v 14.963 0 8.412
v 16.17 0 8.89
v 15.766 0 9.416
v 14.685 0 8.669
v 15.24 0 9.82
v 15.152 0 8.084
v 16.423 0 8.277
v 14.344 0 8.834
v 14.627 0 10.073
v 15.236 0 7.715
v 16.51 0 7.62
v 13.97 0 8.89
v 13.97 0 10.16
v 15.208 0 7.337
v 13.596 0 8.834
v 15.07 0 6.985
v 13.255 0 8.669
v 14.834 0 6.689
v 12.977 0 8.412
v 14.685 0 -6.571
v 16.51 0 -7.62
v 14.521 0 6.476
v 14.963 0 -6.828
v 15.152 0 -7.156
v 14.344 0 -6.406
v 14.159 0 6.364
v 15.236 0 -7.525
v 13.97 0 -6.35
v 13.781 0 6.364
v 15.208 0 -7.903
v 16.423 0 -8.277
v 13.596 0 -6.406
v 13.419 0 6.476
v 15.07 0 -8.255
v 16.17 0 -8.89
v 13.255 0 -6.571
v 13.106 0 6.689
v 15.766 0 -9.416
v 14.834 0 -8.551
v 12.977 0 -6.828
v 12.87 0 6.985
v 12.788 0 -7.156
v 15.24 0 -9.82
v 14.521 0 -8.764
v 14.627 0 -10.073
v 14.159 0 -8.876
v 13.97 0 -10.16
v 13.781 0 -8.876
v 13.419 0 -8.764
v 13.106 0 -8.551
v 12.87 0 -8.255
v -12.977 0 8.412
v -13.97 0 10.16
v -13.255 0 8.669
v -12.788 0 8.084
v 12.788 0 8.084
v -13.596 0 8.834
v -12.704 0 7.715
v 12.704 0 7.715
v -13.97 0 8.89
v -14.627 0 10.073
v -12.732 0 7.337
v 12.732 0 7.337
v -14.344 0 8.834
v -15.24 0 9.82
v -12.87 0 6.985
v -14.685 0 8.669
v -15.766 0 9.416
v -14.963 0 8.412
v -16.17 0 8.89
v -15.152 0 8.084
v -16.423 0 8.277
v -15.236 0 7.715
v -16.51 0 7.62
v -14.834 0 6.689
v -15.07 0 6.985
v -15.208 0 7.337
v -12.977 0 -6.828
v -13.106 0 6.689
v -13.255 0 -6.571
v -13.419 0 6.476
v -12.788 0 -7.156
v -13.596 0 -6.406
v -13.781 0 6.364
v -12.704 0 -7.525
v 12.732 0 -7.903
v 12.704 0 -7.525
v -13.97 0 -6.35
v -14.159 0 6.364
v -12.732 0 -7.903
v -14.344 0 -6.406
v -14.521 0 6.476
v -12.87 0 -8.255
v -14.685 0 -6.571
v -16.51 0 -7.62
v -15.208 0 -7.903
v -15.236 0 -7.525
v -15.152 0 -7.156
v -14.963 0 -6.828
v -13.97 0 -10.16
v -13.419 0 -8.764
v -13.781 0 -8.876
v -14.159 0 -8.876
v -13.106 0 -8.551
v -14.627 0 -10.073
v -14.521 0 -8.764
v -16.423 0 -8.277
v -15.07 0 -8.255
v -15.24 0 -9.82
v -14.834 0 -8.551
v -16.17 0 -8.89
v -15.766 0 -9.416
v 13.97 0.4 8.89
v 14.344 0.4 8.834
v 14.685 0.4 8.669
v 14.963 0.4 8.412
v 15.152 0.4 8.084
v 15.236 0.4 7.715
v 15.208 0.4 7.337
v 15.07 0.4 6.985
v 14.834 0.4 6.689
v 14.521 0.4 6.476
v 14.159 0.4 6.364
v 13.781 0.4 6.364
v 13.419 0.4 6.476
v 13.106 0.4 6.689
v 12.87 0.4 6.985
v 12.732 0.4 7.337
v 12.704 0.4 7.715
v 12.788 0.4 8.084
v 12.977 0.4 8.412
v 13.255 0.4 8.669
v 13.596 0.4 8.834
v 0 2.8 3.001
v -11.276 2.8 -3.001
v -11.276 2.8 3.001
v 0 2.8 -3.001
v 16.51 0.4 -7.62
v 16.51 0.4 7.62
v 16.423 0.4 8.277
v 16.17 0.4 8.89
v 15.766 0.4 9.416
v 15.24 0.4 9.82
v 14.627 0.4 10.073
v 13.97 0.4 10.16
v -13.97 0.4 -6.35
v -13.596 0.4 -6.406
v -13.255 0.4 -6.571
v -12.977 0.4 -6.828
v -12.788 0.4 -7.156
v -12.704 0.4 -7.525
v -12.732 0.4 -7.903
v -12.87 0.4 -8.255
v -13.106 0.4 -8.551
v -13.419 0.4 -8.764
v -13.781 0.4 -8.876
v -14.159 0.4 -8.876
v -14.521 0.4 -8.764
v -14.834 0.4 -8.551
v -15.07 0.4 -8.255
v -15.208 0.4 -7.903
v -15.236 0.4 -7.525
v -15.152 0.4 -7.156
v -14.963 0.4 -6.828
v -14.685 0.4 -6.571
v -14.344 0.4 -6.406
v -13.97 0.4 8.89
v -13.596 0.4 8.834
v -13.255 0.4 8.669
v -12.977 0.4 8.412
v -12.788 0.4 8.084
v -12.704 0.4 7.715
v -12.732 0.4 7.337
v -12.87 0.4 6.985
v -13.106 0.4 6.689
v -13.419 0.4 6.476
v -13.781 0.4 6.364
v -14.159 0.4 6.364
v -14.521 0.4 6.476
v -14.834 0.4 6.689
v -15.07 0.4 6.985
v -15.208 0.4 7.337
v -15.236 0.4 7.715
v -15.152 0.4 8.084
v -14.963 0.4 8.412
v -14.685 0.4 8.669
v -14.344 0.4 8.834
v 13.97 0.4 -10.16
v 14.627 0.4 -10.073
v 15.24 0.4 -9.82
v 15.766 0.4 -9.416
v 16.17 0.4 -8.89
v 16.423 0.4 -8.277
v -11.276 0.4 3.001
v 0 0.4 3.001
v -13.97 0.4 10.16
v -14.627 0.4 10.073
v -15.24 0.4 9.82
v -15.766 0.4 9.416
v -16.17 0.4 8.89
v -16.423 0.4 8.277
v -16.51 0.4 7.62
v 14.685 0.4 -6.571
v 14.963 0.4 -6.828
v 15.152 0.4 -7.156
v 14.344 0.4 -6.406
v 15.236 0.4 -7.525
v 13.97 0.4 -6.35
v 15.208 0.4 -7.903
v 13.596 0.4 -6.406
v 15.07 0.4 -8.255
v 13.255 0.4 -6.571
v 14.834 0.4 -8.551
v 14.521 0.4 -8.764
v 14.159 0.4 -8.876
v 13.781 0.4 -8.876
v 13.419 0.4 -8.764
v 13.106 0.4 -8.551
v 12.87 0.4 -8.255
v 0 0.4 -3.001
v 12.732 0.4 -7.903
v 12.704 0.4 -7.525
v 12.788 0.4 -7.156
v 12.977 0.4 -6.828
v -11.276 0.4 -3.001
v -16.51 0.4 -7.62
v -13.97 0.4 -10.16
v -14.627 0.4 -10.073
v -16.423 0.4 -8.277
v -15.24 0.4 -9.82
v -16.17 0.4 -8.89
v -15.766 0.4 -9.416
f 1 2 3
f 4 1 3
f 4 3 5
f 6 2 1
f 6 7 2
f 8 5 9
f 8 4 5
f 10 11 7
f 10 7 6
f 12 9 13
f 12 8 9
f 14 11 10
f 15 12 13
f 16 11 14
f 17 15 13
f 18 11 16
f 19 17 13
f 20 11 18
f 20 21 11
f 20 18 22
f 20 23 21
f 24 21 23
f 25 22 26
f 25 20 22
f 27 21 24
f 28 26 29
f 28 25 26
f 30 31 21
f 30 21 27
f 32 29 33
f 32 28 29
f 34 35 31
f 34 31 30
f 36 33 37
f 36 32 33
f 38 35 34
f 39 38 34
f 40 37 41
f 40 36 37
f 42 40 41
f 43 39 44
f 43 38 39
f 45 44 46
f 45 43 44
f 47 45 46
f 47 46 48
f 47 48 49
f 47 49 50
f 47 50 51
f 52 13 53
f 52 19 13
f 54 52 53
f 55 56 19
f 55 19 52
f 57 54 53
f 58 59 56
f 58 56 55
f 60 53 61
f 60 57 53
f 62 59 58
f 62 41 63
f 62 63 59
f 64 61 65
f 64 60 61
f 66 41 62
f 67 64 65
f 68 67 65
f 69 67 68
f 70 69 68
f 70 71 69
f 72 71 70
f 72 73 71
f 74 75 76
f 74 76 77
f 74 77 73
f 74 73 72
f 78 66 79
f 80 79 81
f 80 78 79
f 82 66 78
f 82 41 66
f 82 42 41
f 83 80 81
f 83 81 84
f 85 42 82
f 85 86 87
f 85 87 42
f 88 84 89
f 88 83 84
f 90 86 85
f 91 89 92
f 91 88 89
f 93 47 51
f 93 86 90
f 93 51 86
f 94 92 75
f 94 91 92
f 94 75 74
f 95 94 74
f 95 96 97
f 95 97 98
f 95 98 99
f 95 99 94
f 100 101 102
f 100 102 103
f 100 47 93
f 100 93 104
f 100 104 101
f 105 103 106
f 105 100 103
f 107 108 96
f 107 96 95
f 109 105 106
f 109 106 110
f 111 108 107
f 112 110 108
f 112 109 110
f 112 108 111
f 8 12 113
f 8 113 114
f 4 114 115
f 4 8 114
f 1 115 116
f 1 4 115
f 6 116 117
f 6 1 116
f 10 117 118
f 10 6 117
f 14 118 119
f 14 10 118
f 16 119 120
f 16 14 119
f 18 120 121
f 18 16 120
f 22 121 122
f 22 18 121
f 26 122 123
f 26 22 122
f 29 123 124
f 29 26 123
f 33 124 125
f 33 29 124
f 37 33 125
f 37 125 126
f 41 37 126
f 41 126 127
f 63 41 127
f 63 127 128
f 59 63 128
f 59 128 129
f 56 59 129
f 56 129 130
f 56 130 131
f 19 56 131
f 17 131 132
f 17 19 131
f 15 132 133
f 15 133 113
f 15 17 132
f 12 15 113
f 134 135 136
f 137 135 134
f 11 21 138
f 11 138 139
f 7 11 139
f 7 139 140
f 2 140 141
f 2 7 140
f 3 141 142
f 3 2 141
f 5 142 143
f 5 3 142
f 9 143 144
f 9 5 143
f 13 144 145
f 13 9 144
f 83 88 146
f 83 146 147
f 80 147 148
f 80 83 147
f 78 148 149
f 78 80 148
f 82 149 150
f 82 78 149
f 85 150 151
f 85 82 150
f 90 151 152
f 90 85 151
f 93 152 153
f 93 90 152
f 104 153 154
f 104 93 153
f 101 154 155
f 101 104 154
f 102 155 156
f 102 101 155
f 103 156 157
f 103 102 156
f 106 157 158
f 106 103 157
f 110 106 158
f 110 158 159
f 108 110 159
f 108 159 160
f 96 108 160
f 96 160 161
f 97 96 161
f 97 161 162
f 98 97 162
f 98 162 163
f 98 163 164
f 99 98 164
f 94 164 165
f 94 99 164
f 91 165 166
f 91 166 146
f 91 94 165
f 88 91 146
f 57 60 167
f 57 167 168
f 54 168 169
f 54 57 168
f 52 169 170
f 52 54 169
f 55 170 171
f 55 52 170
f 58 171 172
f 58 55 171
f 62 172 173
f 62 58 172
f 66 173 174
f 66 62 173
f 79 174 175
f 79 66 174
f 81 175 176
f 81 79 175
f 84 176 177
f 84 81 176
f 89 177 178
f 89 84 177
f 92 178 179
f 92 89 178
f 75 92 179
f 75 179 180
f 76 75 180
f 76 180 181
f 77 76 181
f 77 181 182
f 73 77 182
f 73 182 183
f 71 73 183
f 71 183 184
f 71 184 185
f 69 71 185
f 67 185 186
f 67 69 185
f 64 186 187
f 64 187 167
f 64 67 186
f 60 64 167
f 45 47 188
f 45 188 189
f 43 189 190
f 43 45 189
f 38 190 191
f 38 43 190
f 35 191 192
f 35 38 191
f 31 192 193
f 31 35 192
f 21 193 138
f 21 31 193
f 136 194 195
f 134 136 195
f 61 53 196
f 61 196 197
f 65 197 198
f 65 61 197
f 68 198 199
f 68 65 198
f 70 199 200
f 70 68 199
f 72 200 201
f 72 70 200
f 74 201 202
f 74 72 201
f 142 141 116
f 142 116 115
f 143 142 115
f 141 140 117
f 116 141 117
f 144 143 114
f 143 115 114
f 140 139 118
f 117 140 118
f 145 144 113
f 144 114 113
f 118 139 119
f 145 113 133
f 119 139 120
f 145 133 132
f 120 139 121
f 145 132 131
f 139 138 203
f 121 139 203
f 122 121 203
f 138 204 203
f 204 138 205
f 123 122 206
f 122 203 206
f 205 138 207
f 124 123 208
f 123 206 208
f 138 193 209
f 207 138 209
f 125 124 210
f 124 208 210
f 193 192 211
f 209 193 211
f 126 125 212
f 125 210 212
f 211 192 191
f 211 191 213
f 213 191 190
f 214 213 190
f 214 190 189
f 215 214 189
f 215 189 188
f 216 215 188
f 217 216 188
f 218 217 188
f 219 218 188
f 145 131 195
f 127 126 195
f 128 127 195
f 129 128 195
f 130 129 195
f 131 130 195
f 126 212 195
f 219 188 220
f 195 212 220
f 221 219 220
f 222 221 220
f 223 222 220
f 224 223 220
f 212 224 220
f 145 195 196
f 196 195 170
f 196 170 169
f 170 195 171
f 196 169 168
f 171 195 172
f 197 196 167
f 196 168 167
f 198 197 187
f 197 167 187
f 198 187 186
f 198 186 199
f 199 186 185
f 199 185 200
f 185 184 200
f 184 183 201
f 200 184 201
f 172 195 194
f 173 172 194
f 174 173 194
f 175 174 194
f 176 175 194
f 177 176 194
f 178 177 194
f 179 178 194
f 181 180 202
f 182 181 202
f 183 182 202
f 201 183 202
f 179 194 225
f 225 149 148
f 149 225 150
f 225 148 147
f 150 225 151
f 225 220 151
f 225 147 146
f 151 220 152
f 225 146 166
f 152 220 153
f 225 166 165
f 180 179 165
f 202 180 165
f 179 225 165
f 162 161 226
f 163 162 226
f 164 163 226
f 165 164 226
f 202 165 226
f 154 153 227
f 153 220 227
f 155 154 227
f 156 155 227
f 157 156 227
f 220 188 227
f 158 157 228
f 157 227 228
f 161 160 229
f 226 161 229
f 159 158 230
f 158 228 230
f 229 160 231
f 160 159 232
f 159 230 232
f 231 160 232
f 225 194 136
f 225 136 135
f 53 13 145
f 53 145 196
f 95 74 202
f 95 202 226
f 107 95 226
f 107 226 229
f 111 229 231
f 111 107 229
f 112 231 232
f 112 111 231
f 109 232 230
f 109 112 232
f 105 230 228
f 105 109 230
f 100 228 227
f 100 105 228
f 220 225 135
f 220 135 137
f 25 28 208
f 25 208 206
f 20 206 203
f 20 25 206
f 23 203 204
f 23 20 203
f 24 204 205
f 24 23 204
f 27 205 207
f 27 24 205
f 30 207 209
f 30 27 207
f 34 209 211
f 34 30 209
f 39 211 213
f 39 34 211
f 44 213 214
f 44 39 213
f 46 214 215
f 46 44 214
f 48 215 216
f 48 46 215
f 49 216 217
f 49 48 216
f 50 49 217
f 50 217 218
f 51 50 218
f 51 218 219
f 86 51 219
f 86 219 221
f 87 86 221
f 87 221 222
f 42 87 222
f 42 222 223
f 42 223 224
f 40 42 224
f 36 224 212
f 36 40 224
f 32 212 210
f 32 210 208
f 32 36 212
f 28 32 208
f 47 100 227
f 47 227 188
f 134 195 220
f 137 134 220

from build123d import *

# Parameters (mm, degrees)
SKETCH1_R           = 1.27
BOSS_EXTRUDE1_DEPTH = 0.4
SKETCH2_W           = 11.275942915
SKETCH2_H           = 6.002616378
BOSS_EXTRUDE2_DEPTH = 2.4


with BuildPart() as part:
    # Sketch1 → Boss-Extrude1 (new body)
    with BuildSketch(Plane(origin=(0, 0, 0), x_dir=(1, 0, 0), z_dir=(0, 1, 0))):
        with BuildLine():
            Line((13.97, -10.16), (-13.97, -10.16))
            ThreePointArc((-13.97, -10.16), (-15.766051224, -9.416051224), (-16.51, -7.62))
            Line((-16.51, -7.62), (-16.51, 7.62))
            ThreePointArc((-16.51, 7.62), (-15.766051224, 9.416051224), (-13.97, 10.16))
            Line((-13.97, 10.16), (13.97, 10.16))
            ThreePointArc((13.97, 10.16), (15.766051224, 9.416051224), (16.51, 7.62))
            Line((16.51, 7.62), (16.51, -7.62))
            ThreePointArc((16.51, -7.62), (15.766051224, -9.416051224), (13.97, -10.16))
        make_face()
        with Locations(Location((-13.97, 7.62, 0), (0, 0, 270))):
            Circle(SKETCH1_R, mode=Mode.SUBTRACT)
        with Locations(Location((13.97, 7.62, 0), (0, 0, 270))):
            Circle(SKETCH1_R, mode=Mode.SUBTRACT)
        with Locations(Location((13.97, -7.62, 0), (0, 0, 270))):
            Circle(SKETCH1_R, mode=Mode.SUBTRACT)
        with Locations(Location((-13.97, -7.62, 0), (0, 0, 270))):
            Circle(SKETCH1_R, mode=Mode.SUBTRACT)
    extrude(amount=BOSS_EXTRUDE1_DEPTH)

    # Sketch2 → Boss-Extrude2 (add)
    with BuildSketch(Plane(origin=(0, 0.4, 0), x_dir=(1, 0, 0), z_dir=(0, 1, 0))):
        with Locations((-5.637971457, 0)):
            Rectangle(SKETCH2_W, SKETCH2_H)
    extrude(amount=BOSS_EXTRUDE2_DEPTH)


solid = part.part
